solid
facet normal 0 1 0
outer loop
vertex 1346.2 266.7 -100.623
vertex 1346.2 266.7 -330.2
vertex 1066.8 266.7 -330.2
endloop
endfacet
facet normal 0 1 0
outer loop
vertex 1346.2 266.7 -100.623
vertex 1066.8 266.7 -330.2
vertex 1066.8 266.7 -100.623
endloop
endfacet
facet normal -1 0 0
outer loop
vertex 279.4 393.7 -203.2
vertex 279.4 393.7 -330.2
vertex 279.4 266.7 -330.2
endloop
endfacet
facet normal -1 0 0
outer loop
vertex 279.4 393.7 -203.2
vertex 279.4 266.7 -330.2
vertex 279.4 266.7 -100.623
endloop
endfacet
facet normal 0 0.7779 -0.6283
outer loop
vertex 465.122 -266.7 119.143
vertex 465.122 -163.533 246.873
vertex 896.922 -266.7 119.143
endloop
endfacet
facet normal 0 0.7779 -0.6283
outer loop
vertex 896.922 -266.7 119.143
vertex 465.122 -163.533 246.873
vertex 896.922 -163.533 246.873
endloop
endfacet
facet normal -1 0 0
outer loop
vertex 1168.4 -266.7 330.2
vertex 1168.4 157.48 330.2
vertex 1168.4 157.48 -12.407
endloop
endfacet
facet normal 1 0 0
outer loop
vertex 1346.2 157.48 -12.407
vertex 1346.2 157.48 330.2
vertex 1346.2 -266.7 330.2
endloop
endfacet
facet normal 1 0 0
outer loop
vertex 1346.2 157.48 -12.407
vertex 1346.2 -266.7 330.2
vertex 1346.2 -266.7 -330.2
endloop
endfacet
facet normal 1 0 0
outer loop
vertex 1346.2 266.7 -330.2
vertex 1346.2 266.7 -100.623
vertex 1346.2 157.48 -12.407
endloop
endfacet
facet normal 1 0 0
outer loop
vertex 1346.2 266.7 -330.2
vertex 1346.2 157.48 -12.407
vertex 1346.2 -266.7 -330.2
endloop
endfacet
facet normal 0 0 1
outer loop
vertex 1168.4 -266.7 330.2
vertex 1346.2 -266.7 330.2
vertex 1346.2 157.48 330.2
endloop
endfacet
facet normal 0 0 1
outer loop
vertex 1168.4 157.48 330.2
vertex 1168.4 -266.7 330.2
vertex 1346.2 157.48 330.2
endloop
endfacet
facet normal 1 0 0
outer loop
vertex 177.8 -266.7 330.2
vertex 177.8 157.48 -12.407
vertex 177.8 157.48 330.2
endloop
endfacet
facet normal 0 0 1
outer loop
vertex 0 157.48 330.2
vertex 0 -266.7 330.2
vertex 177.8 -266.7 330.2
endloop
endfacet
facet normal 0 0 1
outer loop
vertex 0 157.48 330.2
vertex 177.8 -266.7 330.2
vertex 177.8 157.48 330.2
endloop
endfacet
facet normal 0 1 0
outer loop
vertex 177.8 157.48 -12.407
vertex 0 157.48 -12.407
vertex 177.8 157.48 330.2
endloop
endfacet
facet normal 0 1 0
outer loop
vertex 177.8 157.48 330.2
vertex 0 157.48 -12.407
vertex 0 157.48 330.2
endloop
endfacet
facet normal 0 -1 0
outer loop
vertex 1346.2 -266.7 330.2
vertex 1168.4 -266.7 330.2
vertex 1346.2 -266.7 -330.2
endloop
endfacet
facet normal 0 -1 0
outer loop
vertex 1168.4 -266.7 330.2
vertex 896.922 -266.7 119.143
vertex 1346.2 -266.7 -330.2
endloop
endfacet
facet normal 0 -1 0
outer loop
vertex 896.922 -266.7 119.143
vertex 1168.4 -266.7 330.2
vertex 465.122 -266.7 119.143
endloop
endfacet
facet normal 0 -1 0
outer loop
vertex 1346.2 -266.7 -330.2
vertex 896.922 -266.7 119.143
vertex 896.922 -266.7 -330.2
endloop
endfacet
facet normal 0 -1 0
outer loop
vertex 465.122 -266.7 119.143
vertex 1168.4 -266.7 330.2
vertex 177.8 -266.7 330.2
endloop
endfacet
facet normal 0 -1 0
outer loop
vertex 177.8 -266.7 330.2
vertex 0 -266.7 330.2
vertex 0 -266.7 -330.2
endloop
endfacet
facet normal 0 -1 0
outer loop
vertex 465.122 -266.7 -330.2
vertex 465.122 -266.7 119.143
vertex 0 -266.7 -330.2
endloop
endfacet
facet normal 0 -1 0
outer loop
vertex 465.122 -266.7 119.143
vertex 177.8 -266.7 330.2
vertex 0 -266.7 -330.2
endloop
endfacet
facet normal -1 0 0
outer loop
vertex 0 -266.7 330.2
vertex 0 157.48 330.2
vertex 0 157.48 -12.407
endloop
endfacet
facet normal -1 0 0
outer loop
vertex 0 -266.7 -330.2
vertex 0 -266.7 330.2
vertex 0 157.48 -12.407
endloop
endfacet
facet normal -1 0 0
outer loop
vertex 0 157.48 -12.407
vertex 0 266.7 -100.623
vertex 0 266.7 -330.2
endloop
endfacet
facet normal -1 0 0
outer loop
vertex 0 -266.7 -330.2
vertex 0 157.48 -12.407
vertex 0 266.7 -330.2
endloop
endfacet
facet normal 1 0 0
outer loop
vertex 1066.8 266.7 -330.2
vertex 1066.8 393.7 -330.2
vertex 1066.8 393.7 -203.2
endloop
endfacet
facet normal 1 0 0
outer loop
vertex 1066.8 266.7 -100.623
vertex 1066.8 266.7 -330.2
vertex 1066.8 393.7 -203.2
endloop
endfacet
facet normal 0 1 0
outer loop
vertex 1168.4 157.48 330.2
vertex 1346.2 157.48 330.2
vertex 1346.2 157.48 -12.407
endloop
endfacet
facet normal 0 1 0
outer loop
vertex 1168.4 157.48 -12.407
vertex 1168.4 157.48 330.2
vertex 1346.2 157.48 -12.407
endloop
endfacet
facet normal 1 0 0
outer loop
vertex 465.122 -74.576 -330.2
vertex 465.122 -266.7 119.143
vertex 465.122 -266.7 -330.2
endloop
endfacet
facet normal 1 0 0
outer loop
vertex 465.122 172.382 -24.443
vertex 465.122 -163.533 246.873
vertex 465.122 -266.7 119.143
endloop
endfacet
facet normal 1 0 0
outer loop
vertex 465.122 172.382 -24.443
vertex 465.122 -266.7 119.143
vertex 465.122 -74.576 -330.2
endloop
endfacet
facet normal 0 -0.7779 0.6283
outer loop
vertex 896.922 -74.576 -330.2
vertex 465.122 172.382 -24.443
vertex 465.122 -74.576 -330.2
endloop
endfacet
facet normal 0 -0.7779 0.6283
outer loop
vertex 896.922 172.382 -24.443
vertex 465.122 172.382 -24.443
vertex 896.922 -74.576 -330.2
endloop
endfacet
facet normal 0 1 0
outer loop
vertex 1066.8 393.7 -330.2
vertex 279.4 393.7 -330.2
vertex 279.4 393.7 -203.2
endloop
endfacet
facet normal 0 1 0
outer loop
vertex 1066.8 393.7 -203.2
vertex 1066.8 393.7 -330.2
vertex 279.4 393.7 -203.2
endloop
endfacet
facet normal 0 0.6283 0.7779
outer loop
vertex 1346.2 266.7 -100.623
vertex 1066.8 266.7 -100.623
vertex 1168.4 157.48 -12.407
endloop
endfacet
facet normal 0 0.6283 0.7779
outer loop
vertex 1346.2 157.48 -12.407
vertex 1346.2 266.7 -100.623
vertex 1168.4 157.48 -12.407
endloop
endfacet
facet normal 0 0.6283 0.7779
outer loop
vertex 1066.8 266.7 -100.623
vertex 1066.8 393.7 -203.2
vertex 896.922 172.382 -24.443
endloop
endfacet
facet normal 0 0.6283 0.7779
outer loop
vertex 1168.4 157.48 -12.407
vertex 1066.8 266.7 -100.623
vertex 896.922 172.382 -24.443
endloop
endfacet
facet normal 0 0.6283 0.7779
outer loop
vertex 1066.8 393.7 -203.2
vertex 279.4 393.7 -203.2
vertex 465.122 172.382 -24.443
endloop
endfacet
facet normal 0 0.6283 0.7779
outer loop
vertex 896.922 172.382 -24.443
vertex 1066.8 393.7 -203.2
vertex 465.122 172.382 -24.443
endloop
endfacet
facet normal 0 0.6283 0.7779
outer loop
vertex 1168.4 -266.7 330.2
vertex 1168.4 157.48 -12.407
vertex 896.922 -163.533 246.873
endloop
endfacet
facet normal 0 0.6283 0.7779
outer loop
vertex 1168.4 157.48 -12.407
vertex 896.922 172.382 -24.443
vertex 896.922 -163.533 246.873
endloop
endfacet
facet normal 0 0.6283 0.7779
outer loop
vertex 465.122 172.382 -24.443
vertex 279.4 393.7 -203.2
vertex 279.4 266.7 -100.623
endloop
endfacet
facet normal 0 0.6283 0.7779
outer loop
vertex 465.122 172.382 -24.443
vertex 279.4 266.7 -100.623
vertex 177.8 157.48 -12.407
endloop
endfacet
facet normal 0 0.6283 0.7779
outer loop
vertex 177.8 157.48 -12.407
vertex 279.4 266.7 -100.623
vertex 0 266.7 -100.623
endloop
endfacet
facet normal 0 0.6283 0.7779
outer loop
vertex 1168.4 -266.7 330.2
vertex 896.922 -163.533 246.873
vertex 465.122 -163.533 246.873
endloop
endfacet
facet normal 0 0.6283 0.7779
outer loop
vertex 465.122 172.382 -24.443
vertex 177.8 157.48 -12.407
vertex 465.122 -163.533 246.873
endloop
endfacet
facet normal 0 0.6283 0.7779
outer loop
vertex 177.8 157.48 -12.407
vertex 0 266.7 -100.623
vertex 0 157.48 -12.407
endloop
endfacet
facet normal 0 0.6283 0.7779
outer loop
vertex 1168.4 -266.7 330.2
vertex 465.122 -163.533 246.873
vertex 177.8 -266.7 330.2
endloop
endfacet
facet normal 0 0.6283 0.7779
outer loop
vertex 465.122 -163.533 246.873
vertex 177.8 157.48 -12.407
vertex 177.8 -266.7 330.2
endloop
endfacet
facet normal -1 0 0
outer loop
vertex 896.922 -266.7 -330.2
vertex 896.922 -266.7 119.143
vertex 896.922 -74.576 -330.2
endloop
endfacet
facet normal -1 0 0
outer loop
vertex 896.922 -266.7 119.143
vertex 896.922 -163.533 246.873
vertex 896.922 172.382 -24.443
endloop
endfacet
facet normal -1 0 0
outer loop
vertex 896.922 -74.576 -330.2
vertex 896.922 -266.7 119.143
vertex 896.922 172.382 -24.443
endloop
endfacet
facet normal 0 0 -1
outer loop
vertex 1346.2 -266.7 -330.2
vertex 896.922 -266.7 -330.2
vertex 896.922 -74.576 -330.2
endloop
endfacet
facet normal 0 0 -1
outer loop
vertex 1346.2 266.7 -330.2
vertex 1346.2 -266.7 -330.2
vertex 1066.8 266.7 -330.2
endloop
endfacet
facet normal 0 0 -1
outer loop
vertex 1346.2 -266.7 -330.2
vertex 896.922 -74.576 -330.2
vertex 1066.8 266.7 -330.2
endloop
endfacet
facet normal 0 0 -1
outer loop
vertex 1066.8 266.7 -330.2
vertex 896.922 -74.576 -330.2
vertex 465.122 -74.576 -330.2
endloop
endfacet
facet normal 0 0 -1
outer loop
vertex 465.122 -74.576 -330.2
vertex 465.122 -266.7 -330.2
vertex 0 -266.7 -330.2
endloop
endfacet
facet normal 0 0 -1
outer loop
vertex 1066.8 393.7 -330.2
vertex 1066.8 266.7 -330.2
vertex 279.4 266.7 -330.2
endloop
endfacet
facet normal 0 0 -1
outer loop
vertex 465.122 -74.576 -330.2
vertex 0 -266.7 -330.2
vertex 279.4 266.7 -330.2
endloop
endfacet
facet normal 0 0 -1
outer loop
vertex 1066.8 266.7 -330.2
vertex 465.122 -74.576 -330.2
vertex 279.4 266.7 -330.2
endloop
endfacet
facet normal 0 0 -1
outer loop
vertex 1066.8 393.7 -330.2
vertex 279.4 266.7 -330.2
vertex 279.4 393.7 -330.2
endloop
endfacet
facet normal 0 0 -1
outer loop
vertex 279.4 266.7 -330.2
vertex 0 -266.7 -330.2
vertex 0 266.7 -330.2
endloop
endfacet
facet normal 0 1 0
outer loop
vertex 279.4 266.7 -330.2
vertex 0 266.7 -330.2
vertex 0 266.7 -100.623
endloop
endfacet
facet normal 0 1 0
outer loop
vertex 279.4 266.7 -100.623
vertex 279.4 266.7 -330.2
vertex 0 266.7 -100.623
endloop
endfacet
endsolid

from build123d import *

# Parameters (mm, degrees)
BOSS_EXTRUDE1_DEPTH     = 1346.2
CUT_EXTRUDE1_DEPTH      = 279.4
CUT_EXTRUDE2_DEPTH      = 1441.932396055
CUT_EXTRUDE2_DEPTH_BACK = 279.4
SKETCH5_W               = 660.4
SKETCH5_H               = 424.18
BOSS_EXTRUDE2_DEPTH     = 177.8
SKETCH6_W               = 660.4
SKETCH6_H               = 424.18
BOSS_EXTRUDE3_DEPTH     = 177.8
SKETCH7_W               = 431.8
SKETCH7_H               = 431.8
CUT_EXTRUDE3_DEPTH      = 660.4


with BuildPart() as part:
    # Sketch1 → Boss-Extrude1 (new body)
    with BuildSketch(Plane(origin=(0, 0, 0), x_dir=(0, 0, -1), z_dir=(1, 0, 0))):
        Polygon((100.623076923, 266.7), (-330.2, -266.7), (330.2, -266.7), (330.2, 266.7), (203.2, 266.7), align=None)
        Polygon((203.2, 393.7), (100.623076923, 266.7), (203.2, 266.7), (330.2, 266.7), (330.2, 393.7), align=None)
    extrude(amount=BOSS_EXTRUDE1_DEPTH)

    # Sketch2 → Cut-Extrude1 (cut)
    with BuildSketch(Plane(origin=(1346.2, 0, 0), x_dir=(0, 0, -1), z_dir=(1, 0, 0))):
        Polygon((330.2, 393.7), (330.2, 266.7), (100.623076923, 266.7), (203.2, 393.7), align=None)
    extrude(amount=-CUT_EXTRUDE1_DEPTH, mode=Mode.SUBTRACT)

    # Sketch3 → Cut-Extrude2 (cut, two sides: drawn at the far end of the back side and taken through both)
    with BuildSketch(Plane.ZY.offset(-CUT_EXTRUDE2_DEPTH_BACK)):
        Polygon((-330.2, 2271.593273182), (-330.2, 393.7), (-330.2, 266.7), (-100.623076923, 266.7), (1777.270196259, 266.7), (4365.963516587, 2987.839370769), (2258.493320327, 4992.732643951), align=None)
    extrude(amount=CUT_EXTRUDE2_DEPTH + CUT_EXTRUDE2_DEPTH_BACK, mode=Mode.SUBTRACT)

    # Sketch5 → Boss-Extrude2 (add)
    with BuildSketch(Plane(origin=(1346.2, 0, 0), x_dir=(0, 0, -1), z_dir=(1, 0, 0))):
        with Locations((0, -54.61)):
            Rectangle(SKETCH5_W, SKETCH5_H)
    extrude(amount=-BOSS_EXTRUDE2_DEPTH)

    # Sketch6 → Boss-Extrude3 (add)
    with BuildSketch(Plane.ZY):
        with Locations((0, -54.61)):
            Rectangle(SKETCH6_W, SKETCH6_H)
    extrude(amount=-BOSS_EXTRUDE3_DEPTH)

    # Sketch7 → Cut-Extrude3 (cut)
    with BuildSketch(Plane(origin=(0, 56.109668756, 69.469113697), x_dir=(1, 0, 0), z_dir=(0, 0.6283371070876211, 0.7779411802037217))):
        with Locations((681.021503016, -66.438627043)):
            Rectangle(SKETCH7_W, SKETCH7_H)
    extrude(amount=-CUT_EXTRUDE3_DEPTH, mode=Mode.SUBTRACT)


solid = part.part
